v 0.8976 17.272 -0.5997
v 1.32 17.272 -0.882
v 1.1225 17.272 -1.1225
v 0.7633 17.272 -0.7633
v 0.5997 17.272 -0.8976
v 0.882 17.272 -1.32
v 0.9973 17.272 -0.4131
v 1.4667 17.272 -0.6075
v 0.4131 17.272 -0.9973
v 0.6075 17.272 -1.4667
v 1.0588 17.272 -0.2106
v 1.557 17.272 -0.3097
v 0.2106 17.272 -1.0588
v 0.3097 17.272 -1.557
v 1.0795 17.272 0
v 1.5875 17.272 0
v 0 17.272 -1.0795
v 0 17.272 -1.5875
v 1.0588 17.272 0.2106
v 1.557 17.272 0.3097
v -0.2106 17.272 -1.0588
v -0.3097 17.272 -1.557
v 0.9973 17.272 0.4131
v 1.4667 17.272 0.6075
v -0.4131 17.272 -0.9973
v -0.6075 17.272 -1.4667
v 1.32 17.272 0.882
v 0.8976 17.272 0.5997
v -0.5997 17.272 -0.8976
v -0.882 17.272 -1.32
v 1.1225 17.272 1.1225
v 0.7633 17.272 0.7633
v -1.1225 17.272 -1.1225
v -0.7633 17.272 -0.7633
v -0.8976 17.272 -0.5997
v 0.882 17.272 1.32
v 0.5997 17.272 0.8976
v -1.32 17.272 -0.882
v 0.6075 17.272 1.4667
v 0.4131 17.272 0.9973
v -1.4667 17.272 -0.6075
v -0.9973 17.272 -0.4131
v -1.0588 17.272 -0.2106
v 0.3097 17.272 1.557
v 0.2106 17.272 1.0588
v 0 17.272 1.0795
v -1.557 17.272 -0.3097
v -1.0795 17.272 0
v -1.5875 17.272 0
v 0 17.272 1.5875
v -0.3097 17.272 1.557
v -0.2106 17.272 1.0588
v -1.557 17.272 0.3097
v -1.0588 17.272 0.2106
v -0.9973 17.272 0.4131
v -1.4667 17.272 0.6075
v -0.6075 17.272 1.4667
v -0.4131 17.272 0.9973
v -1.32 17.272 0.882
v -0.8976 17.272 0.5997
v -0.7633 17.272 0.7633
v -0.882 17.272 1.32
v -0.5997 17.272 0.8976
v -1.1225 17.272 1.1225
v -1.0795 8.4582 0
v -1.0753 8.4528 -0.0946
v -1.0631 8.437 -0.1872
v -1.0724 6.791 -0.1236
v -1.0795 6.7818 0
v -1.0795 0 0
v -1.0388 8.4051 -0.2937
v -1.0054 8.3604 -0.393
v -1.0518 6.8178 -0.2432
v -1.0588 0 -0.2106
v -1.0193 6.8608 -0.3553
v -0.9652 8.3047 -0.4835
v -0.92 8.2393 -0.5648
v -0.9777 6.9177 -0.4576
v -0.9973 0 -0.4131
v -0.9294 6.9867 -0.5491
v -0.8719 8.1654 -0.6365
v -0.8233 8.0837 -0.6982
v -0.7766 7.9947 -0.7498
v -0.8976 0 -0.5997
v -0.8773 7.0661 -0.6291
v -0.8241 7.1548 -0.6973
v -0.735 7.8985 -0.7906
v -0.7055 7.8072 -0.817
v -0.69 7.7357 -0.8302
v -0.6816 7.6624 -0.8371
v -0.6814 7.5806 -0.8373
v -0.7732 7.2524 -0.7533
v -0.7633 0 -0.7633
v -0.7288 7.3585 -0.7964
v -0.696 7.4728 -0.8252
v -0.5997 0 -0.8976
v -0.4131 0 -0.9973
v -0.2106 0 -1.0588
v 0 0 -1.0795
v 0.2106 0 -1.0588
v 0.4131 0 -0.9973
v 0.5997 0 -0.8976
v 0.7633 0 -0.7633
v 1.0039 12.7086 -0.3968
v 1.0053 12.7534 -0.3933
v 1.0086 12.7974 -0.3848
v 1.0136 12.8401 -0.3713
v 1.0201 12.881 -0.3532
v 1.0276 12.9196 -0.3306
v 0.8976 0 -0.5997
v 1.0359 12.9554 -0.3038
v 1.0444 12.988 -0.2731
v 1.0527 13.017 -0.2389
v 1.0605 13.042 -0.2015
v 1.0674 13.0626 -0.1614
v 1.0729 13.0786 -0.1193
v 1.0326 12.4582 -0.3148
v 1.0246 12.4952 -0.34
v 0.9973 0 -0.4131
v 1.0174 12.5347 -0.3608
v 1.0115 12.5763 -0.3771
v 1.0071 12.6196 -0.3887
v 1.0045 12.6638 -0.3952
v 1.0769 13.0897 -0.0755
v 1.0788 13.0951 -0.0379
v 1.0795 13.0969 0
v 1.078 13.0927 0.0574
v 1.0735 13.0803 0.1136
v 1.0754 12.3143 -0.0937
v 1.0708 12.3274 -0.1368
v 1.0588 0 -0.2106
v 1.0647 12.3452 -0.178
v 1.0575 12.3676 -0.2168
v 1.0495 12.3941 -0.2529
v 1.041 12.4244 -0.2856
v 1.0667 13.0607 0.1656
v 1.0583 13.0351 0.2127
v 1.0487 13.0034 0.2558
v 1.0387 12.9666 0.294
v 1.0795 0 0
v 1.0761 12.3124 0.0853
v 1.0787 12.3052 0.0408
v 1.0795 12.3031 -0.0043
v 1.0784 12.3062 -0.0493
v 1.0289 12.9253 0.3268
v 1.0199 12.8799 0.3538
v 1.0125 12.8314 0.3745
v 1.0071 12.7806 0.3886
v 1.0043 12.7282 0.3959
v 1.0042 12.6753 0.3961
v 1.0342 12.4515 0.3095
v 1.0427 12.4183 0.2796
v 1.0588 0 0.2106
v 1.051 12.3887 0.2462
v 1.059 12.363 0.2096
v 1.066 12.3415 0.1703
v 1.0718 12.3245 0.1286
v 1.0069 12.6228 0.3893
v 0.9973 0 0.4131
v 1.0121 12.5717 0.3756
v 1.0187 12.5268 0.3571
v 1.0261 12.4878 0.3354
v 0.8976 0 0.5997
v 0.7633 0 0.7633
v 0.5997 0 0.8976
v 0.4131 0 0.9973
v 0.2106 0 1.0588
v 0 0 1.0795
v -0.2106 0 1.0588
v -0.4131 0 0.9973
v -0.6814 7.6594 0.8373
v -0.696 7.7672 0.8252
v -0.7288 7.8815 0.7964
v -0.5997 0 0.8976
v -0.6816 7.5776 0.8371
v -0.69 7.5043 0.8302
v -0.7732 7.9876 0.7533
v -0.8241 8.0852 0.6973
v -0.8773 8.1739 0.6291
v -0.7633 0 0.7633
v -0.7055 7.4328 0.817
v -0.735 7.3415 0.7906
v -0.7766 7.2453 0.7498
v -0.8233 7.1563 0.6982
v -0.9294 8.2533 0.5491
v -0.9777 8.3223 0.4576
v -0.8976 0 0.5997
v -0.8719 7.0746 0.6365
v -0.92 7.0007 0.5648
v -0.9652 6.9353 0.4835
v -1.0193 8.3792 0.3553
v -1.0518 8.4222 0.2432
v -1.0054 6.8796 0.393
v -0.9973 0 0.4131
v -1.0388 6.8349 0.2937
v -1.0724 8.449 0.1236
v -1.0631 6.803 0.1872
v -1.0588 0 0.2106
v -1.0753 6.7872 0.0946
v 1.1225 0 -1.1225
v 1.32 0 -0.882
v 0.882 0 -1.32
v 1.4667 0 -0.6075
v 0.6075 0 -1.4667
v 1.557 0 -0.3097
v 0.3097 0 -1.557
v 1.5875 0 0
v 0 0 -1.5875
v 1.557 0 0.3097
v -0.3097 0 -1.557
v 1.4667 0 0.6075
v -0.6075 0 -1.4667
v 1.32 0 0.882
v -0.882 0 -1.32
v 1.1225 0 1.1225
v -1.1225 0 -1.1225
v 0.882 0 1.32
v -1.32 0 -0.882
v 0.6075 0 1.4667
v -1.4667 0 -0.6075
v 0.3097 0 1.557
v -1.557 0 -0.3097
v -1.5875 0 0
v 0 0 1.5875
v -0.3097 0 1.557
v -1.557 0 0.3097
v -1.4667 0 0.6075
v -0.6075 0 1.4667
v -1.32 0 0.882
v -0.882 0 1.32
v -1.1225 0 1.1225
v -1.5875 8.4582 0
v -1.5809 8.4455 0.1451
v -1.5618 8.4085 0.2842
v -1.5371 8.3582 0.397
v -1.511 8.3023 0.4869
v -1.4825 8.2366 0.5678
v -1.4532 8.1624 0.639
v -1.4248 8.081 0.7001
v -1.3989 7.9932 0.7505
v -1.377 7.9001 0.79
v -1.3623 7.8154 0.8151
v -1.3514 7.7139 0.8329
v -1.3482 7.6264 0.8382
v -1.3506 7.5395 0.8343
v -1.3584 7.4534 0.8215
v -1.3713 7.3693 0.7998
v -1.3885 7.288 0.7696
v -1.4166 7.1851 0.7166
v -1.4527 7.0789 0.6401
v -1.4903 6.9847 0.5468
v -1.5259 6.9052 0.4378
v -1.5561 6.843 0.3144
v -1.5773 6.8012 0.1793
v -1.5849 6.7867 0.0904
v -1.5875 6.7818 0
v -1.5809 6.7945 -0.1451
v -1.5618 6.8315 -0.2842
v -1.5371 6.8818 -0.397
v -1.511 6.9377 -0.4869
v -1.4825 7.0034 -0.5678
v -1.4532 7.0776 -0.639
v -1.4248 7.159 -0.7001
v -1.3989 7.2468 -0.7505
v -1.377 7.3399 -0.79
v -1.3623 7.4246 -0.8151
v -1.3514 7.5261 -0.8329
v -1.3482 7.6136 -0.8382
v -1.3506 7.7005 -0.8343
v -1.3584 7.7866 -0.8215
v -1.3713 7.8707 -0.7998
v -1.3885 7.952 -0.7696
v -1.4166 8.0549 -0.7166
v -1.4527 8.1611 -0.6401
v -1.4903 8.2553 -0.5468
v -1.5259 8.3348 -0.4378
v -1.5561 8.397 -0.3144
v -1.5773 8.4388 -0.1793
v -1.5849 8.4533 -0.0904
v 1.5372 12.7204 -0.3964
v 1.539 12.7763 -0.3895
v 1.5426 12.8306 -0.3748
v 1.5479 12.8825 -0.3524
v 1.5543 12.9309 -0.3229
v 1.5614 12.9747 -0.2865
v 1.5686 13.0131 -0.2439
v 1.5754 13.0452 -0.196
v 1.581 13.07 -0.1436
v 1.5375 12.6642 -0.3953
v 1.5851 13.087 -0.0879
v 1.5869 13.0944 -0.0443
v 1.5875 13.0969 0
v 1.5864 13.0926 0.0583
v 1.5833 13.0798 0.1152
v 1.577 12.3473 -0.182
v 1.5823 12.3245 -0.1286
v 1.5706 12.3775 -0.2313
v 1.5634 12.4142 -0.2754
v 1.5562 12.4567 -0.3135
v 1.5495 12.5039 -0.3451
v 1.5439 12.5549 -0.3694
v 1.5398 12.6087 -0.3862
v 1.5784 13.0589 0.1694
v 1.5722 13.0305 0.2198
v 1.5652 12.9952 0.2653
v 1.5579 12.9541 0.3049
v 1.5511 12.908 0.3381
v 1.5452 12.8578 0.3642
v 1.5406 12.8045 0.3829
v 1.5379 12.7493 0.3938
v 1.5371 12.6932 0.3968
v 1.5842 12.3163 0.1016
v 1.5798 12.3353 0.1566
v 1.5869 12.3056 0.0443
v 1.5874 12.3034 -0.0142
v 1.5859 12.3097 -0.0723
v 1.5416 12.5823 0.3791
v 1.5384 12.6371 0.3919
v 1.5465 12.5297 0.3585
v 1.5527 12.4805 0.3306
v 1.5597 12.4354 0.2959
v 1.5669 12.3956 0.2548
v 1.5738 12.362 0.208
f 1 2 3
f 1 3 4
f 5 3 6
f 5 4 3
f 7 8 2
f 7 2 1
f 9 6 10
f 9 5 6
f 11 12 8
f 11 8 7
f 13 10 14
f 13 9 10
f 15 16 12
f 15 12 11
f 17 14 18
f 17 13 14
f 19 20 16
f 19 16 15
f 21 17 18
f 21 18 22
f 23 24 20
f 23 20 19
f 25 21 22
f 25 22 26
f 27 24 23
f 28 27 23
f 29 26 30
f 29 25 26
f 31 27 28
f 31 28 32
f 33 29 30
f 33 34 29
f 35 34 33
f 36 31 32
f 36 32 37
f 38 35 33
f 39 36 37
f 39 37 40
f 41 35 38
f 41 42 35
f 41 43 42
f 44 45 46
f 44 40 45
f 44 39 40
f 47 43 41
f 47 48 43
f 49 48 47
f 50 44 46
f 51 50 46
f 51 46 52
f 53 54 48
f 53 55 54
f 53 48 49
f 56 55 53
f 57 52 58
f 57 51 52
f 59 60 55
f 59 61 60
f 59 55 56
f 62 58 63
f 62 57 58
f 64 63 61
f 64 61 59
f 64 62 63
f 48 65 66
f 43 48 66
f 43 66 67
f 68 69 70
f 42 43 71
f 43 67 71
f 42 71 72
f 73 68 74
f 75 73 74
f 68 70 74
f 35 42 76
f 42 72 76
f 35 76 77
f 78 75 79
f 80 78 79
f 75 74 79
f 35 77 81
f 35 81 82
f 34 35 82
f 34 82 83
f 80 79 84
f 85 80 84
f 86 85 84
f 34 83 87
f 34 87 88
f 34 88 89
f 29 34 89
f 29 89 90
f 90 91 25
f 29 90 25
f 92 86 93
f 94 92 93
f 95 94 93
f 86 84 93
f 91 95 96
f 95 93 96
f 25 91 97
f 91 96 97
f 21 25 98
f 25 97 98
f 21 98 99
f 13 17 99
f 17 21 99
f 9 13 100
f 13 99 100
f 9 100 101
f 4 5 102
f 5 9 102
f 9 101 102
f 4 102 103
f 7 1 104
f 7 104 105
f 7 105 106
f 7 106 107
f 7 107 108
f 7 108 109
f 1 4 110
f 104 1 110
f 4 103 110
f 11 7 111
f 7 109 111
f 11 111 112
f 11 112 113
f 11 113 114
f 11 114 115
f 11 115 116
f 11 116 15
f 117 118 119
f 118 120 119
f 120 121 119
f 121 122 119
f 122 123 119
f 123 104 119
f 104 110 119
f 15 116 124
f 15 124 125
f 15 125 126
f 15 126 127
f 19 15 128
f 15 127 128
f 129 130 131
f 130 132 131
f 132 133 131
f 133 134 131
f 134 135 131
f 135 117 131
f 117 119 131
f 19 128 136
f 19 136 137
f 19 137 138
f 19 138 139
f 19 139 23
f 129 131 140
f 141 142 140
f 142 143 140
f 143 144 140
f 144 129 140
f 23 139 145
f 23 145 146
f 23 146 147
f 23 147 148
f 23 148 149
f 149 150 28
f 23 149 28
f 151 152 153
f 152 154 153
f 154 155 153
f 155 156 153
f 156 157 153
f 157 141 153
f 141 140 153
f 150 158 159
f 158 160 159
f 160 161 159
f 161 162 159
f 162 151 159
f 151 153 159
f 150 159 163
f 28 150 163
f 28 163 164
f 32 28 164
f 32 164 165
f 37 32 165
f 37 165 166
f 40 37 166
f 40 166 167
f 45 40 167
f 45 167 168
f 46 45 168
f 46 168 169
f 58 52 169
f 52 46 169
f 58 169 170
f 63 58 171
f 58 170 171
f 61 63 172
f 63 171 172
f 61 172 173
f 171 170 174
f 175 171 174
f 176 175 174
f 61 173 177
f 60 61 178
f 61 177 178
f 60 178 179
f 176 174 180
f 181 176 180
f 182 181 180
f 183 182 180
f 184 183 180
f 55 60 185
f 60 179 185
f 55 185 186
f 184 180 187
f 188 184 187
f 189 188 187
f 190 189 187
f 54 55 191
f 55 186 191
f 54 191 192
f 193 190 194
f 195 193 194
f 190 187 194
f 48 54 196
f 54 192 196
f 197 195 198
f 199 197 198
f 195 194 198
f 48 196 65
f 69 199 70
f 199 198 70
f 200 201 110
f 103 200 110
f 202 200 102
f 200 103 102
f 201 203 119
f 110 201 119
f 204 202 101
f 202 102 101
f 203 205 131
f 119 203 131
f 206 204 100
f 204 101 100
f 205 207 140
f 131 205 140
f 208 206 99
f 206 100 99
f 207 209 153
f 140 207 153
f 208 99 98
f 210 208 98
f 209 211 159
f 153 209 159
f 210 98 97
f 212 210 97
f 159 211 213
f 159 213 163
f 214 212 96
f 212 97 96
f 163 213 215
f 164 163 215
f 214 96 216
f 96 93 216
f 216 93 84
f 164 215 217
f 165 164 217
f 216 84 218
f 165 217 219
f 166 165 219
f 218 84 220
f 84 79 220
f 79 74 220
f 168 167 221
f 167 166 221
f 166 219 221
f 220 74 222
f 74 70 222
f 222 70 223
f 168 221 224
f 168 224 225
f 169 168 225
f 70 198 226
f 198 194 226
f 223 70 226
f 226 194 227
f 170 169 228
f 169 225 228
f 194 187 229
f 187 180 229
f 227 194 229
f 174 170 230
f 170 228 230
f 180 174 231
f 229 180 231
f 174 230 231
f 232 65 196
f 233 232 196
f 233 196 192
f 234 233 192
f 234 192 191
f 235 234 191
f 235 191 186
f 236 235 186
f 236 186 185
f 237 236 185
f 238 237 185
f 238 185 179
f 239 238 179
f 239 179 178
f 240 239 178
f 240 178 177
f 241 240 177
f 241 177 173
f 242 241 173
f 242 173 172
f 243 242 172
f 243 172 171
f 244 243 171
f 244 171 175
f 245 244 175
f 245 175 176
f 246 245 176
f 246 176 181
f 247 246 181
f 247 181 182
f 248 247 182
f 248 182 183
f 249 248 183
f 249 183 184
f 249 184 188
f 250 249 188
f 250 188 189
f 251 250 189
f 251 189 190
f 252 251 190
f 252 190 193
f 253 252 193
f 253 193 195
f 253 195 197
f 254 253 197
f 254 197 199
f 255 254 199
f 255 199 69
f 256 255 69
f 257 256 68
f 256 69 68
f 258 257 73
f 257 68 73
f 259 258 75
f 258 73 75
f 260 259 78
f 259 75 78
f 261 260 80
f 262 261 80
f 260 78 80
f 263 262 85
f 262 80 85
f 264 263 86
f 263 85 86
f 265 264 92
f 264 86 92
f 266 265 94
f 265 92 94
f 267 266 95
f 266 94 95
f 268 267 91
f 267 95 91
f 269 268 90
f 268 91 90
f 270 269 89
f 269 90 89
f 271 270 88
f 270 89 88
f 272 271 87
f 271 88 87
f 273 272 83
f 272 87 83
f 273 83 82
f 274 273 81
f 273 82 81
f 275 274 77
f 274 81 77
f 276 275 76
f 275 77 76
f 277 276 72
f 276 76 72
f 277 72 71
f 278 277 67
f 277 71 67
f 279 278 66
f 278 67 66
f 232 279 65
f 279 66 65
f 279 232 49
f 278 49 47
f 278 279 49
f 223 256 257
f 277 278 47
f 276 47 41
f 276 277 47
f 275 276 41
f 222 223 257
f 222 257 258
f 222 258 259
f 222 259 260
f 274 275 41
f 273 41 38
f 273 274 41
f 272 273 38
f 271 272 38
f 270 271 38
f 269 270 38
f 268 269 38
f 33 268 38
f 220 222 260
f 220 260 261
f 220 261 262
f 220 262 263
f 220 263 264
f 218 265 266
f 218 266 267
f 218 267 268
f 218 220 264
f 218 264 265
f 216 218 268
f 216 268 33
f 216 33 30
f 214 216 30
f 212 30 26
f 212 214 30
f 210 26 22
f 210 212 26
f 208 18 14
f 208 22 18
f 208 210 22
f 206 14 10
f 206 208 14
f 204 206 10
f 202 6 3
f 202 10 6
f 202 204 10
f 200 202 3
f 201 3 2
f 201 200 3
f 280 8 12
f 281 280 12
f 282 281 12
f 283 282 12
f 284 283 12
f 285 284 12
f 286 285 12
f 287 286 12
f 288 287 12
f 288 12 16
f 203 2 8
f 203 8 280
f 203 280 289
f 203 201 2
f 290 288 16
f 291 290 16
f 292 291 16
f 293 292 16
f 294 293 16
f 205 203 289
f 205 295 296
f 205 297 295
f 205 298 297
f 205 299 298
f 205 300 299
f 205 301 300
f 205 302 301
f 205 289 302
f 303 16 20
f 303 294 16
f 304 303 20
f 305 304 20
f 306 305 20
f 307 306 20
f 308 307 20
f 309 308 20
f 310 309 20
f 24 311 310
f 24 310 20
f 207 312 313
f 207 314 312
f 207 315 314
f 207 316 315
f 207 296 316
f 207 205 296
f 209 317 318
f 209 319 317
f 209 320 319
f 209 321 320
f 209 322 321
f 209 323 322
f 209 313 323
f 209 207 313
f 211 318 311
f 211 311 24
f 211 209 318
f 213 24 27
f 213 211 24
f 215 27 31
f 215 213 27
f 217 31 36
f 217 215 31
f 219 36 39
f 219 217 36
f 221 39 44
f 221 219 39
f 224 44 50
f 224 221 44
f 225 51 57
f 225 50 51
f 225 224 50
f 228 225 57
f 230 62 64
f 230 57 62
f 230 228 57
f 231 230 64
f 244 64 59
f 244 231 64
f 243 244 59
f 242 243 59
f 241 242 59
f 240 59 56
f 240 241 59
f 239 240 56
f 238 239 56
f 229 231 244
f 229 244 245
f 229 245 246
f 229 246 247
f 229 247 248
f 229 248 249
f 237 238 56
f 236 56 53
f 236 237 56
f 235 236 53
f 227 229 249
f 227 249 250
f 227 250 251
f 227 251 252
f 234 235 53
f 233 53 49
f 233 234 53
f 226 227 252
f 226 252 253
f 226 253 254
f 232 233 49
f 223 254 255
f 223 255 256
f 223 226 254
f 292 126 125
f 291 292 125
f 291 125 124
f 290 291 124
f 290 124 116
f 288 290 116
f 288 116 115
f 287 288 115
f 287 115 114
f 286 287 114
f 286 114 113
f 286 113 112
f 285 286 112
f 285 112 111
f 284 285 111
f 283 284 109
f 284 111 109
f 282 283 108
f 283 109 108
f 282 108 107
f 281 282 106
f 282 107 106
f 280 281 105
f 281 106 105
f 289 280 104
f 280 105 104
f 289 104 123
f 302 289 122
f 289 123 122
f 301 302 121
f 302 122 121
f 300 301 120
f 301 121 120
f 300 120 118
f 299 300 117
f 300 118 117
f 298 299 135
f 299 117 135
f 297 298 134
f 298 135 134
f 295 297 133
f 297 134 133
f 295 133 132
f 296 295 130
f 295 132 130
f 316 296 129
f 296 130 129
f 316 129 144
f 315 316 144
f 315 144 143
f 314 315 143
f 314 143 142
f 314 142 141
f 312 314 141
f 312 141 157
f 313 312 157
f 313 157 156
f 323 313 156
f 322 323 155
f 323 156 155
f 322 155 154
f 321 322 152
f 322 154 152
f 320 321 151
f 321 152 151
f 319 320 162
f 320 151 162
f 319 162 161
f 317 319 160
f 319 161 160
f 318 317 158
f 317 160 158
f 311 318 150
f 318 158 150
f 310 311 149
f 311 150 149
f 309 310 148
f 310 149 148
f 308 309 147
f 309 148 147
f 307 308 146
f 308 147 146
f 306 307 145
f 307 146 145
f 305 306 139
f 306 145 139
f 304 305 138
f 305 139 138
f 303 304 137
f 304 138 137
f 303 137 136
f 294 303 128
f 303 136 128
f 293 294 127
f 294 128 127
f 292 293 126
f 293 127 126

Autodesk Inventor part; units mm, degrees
ref_plane "YZ Plane" through (0, 0, 0) normal (1, 0, 0) x (0, 1, 0)
ref_plane "XZ Plane" through (0, 0, 0) normal (0, 1, 0) x (-1, 0, 0)
ref_plane "XY Plane" through (0, 0, 0) normal (0, 0, 1) x (1, 0, 0)
sketch "Sketch1" plane through (0, 0, 0) normal (0, 1, 0) x (-1, 0, 0)
  circle A0 centre (0, 0) radius 1.0795
  circle A1 centre (0, 0) radius 1.5875
  dimension "d0" = 2.159
  dimension "d1" = 3.175
extrude "Extrusion1" add sketch "Sketch1" along normal blind 17.272
sketch "Sketch2" plane through (0, 0, 0) normal (1, 0, 0) x (0, 1, 0)
  circle A0 centre (7.62, 0) radius 0.8382
  line L0 (17.272, -1.5875) -> (17.272, 1.5875) projected
  circle A1 centre (12.7, 0) radius 0.3969
  line L1 (17.272, 1.0795) -> (17.272, -1.0795) projected
  point P0 (0, 0)
  dimension "d4" = 1.6764
  dimension "d5" = 9.652
  dimension "d8" = 0.7937
  dimension "d9" = 4.572
extrude "Extrusion2" cut sketch "Sketch2" against normal blind 17.272 contours A0
extrude "Extrusion3" cut sketch "Sketch2" along normal blind 25.4 contours A1
properties part number "Valve Tube"
